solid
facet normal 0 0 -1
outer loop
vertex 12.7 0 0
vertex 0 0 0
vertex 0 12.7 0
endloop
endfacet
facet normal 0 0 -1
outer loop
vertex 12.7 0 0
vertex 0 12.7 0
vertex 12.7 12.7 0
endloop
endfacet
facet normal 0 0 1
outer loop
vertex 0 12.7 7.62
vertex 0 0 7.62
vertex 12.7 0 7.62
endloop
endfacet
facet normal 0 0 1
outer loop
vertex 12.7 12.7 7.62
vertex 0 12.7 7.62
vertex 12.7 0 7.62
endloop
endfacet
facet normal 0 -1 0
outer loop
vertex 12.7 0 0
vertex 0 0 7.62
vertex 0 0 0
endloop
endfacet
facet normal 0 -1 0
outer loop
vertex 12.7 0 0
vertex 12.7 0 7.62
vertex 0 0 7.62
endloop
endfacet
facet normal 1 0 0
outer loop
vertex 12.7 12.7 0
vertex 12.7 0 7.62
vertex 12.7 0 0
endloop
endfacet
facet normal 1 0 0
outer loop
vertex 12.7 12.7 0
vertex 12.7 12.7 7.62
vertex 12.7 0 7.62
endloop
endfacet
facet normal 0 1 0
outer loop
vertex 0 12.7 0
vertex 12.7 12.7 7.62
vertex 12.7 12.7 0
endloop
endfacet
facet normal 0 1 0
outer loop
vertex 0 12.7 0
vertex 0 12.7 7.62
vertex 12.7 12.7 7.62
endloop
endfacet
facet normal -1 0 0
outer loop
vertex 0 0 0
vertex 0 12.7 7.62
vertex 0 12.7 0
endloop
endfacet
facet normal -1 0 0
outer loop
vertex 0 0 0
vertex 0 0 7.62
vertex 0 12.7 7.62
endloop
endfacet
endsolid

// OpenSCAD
ViewScale = [0.0254, 0.0254, 0.0254];

module cube()
{
    linear_extrude(300)
    square(500, 500);
}

scale(ViewScale)
{
    cube();
}
